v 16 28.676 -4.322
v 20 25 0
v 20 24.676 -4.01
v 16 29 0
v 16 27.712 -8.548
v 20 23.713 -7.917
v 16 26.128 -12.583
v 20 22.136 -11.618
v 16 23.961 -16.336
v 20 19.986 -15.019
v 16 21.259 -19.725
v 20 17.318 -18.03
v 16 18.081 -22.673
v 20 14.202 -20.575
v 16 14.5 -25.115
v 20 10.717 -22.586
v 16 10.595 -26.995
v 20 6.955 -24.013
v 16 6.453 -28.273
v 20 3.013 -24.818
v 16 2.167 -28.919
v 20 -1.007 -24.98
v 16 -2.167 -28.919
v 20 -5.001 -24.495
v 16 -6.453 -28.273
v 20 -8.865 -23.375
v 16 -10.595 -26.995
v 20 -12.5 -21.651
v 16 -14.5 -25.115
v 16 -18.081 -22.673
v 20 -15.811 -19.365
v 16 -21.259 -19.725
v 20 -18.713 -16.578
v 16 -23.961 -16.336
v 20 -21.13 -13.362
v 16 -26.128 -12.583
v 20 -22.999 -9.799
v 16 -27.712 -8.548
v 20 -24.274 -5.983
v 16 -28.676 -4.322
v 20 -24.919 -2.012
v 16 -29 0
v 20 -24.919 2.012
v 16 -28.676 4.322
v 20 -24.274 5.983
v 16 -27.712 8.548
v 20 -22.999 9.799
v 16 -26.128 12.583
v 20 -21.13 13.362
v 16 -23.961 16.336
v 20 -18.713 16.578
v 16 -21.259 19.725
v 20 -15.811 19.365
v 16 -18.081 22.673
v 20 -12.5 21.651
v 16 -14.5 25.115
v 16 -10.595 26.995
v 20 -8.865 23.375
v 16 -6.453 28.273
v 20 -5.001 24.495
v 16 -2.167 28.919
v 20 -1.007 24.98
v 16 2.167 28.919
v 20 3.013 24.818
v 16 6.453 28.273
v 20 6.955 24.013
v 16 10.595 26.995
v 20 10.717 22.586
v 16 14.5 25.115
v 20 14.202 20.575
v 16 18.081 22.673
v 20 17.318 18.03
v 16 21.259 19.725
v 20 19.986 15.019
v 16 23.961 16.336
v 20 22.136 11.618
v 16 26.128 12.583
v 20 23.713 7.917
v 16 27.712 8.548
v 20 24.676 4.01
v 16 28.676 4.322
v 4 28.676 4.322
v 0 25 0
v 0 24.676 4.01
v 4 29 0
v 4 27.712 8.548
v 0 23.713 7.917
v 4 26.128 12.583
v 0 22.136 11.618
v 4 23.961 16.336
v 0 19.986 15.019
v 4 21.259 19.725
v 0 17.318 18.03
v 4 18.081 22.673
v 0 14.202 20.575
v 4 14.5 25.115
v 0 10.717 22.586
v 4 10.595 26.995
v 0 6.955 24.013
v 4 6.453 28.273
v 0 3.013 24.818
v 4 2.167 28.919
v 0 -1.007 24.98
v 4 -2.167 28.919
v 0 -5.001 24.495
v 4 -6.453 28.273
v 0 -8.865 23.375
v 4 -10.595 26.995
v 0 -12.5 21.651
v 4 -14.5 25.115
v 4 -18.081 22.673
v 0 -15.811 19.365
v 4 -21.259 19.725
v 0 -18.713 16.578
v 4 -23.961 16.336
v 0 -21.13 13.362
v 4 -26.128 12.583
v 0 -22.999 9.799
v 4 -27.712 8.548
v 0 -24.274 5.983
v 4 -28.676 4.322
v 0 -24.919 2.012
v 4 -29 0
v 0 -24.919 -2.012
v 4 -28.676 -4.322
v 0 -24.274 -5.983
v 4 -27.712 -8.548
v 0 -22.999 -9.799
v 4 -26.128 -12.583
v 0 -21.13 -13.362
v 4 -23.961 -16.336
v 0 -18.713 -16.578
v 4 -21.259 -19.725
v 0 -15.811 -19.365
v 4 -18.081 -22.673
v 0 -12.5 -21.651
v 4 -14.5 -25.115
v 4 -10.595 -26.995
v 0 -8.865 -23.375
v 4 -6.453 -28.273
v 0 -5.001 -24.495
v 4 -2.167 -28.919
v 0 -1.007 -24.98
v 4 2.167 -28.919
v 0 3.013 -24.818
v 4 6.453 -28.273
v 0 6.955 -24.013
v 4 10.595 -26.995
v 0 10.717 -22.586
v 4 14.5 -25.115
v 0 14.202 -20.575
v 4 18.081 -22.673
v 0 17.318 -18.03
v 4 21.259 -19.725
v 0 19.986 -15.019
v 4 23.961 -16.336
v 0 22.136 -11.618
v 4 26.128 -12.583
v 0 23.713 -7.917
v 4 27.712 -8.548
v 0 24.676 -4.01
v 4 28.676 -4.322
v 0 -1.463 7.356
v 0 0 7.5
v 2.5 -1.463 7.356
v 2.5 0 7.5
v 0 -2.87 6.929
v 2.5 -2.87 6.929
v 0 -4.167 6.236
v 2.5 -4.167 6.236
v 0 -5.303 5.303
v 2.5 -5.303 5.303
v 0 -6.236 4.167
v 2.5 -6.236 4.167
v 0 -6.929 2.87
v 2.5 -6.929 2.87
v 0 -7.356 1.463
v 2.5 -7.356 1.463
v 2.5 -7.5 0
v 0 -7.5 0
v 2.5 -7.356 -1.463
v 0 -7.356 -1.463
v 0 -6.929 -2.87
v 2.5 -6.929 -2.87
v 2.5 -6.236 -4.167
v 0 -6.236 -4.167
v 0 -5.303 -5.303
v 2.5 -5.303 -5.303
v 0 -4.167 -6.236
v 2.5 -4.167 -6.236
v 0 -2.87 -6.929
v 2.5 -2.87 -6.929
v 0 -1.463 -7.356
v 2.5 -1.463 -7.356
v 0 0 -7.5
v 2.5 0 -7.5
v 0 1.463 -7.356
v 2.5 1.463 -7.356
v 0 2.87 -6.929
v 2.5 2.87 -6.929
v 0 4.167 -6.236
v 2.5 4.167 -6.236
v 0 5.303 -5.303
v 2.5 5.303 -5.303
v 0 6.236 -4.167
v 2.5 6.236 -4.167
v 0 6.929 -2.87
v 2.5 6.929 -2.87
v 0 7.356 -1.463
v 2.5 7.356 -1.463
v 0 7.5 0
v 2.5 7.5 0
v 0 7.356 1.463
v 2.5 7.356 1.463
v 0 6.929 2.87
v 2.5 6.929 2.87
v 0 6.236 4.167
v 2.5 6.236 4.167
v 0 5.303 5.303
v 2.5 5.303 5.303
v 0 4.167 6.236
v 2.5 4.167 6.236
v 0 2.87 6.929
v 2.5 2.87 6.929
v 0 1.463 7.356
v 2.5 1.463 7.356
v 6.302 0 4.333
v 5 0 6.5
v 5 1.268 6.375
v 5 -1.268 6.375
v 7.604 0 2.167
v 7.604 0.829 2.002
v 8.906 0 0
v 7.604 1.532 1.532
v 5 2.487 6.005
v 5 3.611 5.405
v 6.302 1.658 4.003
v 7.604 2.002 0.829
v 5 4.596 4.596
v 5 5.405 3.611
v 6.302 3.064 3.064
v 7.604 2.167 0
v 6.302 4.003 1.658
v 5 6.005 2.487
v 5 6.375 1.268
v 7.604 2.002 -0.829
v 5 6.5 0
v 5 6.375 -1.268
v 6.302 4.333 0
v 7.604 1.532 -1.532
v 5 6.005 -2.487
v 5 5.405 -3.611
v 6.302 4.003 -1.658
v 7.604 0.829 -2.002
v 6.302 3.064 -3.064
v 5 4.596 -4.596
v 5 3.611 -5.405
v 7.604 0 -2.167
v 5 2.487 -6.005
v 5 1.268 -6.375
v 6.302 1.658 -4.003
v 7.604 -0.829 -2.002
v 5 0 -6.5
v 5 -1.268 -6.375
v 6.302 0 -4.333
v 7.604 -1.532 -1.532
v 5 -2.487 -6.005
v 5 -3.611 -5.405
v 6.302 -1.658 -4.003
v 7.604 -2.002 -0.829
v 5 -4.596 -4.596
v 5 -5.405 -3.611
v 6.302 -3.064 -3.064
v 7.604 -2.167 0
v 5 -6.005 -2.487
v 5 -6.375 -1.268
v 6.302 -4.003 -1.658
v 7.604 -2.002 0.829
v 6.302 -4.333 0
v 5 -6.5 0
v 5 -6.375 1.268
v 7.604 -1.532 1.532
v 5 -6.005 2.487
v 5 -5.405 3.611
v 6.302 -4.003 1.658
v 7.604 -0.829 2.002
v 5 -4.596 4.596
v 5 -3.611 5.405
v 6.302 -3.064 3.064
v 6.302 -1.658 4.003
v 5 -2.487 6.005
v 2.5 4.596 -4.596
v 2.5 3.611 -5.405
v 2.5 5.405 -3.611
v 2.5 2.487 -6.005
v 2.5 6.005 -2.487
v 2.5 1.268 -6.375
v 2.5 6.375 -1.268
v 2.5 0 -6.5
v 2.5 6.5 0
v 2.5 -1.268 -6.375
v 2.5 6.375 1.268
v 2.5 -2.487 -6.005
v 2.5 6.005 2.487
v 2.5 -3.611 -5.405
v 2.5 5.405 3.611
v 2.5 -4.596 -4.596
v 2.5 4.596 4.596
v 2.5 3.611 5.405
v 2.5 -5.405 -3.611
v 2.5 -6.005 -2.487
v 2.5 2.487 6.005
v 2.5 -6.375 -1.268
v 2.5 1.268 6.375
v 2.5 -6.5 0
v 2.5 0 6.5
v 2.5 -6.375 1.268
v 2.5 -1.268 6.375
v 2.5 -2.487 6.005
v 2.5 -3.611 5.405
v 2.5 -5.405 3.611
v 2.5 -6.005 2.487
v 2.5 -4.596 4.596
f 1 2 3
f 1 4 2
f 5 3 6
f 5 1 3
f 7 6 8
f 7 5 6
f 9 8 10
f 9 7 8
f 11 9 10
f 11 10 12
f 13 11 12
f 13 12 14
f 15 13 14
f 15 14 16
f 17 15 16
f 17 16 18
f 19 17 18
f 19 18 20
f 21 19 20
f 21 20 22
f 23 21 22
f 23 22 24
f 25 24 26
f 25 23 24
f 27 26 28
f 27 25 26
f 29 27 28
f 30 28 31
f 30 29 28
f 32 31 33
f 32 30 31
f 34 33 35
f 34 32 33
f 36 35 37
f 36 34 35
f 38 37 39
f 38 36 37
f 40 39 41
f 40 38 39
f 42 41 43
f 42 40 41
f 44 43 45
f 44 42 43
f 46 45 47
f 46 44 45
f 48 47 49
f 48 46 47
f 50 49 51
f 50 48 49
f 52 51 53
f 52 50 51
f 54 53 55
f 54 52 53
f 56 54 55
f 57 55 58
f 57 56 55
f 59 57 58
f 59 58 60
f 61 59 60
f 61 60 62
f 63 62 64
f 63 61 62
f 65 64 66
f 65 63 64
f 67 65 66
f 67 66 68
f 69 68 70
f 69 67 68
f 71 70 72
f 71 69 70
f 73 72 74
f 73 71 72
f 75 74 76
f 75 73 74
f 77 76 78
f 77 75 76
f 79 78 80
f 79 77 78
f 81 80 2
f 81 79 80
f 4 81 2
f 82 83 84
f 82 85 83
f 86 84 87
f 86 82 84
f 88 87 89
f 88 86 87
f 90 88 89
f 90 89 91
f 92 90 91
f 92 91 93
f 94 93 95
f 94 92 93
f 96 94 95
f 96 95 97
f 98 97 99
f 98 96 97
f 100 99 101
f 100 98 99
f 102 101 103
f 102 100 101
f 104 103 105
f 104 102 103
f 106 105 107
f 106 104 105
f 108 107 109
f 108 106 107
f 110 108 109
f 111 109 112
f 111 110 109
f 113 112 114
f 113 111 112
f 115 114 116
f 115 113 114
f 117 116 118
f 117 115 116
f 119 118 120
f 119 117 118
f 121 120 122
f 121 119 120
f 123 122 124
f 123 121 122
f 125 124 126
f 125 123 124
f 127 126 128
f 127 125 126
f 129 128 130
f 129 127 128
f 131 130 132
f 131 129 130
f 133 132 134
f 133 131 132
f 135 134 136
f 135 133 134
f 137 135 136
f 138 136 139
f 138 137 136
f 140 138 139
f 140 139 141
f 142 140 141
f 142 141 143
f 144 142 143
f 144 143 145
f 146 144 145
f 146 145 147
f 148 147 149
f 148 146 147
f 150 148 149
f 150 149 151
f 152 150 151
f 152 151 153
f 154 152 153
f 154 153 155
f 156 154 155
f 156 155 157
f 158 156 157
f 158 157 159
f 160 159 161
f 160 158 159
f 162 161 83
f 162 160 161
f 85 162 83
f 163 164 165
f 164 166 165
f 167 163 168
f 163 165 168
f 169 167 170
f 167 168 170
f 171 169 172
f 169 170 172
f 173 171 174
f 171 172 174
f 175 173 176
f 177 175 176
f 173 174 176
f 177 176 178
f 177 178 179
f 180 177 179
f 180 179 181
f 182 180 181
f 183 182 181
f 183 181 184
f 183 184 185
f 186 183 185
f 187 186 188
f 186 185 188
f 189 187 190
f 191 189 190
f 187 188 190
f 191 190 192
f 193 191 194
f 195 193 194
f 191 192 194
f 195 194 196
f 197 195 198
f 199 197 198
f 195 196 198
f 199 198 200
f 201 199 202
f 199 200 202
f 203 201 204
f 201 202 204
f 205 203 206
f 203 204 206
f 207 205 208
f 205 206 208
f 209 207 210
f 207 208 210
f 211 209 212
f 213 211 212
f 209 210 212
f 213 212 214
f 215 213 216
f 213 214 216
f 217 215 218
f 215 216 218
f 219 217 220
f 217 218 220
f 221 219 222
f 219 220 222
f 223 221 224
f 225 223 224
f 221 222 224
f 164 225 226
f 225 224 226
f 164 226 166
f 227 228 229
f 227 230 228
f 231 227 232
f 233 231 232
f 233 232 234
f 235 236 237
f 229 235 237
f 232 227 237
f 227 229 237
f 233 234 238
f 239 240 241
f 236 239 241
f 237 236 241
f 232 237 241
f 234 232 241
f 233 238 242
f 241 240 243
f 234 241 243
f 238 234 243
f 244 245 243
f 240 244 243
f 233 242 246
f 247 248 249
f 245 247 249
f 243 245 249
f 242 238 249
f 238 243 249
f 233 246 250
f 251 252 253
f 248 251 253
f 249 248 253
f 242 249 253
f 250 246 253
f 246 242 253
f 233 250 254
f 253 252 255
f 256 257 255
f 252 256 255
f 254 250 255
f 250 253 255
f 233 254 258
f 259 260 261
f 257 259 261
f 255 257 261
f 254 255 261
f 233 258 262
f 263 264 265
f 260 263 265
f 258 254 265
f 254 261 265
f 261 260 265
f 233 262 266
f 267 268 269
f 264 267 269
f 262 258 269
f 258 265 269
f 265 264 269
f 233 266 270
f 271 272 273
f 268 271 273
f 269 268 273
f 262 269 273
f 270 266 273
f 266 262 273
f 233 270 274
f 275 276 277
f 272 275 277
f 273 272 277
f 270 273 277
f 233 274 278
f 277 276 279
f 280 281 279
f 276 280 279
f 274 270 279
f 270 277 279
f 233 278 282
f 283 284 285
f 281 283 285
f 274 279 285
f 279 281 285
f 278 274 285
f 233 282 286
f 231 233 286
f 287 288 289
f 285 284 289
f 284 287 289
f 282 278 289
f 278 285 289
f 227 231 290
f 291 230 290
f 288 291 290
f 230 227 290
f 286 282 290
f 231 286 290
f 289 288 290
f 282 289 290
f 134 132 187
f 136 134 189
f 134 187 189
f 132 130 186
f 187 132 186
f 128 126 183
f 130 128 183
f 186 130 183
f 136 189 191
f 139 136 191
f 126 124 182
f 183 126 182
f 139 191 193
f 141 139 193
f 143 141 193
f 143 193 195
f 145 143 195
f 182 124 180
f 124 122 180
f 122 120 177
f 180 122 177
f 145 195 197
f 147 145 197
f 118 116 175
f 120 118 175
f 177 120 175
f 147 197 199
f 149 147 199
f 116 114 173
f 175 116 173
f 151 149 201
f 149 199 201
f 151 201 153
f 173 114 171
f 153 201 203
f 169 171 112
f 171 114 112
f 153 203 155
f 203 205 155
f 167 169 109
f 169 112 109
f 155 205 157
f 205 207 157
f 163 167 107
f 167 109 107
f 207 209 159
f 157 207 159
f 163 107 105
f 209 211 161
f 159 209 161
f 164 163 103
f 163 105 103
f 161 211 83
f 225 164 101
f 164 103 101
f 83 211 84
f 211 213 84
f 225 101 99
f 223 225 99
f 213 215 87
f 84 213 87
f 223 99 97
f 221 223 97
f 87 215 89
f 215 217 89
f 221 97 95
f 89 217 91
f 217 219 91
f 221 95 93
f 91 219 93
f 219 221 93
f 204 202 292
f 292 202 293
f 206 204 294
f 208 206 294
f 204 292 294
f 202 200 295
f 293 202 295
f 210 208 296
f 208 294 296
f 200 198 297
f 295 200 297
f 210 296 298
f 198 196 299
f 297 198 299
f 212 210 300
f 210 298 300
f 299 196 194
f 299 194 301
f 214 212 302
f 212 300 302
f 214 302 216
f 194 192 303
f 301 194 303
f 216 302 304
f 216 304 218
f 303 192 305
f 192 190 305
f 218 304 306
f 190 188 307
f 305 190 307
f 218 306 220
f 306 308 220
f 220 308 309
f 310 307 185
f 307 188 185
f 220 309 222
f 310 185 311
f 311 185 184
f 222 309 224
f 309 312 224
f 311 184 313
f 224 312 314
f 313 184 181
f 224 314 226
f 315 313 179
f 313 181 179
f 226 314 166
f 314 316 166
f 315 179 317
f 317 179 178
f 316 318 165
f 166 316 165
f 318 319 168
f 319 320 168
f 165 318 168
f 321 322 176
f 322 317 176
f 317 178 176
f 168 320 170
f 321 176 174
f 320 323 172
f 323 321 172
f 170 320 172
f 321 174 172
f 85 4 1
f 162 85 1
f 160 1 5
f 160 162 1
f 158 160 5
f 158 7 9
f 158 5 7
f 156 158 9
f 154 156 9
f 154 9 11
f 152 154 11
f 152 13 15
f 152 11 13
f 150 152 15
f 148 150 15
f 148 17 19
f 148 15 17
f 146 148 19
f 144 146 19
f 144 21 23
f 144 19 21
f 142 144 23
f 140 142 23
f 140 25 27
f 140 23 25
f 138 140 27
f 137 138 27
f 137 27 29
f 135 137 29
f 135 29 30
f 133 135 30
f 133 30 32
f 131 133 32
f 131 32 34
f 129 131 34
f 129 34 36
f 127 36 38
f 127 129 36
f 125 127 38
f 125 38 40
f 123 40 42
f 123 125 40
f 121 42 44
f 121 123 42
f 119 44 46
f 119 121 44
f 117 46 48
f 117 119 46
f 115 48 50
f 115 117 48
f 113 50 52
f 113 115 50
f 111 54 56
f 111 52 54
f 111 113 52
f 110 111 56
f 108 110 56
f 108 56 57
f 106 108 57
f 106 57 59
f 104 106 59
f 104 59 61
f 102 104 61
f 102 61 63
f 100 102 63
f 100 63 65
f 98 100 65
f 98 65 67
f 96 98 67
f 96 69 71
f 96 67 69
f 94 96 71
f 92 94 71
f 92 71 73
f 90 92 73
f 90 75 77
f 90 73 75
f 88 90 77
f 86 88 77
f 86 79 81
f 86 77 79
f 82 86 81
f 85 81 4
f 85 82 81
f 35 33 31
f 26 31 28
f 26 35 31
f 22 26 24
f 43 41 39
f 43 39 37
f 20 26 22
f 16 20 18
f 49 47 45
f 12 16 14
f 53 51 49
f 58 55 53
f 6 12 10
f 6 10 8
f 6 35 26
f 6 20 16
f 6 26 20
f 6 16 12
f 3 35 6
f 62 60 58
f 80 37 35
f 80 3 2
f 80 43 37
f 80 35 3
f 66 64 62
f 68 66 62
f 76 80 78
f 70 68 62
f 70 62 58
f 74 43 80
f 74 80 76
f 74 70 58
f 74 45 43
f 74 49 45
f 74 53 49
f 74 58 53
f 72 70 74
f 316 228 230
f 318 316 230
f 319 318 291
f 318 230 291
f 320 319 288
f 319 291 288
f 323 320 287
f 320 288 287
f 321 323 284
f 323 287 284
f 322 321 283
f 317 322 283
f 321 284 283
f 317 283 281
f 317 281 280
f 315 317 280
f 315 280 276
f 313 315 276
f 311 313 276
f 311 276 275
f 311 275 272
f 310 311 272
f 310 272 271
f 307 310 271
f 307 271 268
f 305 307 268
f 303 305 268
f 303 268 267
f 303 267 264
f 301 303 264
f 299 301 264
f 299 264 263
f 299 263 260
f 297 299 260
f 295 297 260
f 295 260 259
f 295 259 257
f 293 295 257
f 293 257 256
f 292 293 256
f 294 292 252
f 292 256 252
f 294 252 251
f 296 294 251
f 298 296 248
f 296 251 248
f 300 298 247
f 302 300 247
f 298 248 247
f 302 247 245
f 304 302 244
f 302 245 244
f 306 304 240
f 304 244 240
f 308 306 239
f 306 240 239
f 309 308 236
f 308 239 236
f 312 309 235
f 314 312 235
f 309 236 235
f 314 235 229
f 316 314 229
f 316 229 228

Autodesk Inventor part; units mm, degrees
ref_plane "YZ Plane" through (0, 0, 0) normal (1, 0, 0) x (0, 1, 0)
ref_plane "XZ Plane" through (0, 0, 0) normal (0, 1, 0) x (-1, 0, 0)
ref_plane "XY Plane" through (0, 0, 0) normal (0, 0, 1) x (1, 0, 0)
sketch "Эскиз1" plane through (0, 0, 0) normal (0, 0, 1) x (1, 0, 0)
  line L0 (0, 0) -> (20, 0)
  line L1 (20, 0) -> (20, 25)
  line L2 (16, 29) -> (4, 29)
  line L3 (0, 25) -> (0, 0)
  line L4 (4, 29) -> (0, 25)
  line L5 (16, 29) -> (20, 25)
  point P0 (20, 29)
  point P1 (0, 29)
  dimension "d14" = 20
  dimension "d15" = 29
  dimension "d16" = 4
  dimension "d17" = 4
  dimension "d18" = 4
  dimension "d19" = 4
revolve "Вращение2" add sketch "Эскиз1" angle 360 about axis through (0, 0, 0) along (1, 0, 0)
sketch "Эскиз3" plane through (0, 0, 0) normal (-1, 0, 0) x (0, 0, 1)
  point P0 (0, 0)
  point P1 (0, 0)
hole "Отверстие2" at (0, 0, 0) direction (1, 0, 0) diameter 13 depth 5 tip angle 118 counterbore diameter 15 counterbore depth 2.5
equation "\"d17\" = d16"
equation "\"d18\" = d16"
equation "\"d19\" = d18"
properties part number "711121"
